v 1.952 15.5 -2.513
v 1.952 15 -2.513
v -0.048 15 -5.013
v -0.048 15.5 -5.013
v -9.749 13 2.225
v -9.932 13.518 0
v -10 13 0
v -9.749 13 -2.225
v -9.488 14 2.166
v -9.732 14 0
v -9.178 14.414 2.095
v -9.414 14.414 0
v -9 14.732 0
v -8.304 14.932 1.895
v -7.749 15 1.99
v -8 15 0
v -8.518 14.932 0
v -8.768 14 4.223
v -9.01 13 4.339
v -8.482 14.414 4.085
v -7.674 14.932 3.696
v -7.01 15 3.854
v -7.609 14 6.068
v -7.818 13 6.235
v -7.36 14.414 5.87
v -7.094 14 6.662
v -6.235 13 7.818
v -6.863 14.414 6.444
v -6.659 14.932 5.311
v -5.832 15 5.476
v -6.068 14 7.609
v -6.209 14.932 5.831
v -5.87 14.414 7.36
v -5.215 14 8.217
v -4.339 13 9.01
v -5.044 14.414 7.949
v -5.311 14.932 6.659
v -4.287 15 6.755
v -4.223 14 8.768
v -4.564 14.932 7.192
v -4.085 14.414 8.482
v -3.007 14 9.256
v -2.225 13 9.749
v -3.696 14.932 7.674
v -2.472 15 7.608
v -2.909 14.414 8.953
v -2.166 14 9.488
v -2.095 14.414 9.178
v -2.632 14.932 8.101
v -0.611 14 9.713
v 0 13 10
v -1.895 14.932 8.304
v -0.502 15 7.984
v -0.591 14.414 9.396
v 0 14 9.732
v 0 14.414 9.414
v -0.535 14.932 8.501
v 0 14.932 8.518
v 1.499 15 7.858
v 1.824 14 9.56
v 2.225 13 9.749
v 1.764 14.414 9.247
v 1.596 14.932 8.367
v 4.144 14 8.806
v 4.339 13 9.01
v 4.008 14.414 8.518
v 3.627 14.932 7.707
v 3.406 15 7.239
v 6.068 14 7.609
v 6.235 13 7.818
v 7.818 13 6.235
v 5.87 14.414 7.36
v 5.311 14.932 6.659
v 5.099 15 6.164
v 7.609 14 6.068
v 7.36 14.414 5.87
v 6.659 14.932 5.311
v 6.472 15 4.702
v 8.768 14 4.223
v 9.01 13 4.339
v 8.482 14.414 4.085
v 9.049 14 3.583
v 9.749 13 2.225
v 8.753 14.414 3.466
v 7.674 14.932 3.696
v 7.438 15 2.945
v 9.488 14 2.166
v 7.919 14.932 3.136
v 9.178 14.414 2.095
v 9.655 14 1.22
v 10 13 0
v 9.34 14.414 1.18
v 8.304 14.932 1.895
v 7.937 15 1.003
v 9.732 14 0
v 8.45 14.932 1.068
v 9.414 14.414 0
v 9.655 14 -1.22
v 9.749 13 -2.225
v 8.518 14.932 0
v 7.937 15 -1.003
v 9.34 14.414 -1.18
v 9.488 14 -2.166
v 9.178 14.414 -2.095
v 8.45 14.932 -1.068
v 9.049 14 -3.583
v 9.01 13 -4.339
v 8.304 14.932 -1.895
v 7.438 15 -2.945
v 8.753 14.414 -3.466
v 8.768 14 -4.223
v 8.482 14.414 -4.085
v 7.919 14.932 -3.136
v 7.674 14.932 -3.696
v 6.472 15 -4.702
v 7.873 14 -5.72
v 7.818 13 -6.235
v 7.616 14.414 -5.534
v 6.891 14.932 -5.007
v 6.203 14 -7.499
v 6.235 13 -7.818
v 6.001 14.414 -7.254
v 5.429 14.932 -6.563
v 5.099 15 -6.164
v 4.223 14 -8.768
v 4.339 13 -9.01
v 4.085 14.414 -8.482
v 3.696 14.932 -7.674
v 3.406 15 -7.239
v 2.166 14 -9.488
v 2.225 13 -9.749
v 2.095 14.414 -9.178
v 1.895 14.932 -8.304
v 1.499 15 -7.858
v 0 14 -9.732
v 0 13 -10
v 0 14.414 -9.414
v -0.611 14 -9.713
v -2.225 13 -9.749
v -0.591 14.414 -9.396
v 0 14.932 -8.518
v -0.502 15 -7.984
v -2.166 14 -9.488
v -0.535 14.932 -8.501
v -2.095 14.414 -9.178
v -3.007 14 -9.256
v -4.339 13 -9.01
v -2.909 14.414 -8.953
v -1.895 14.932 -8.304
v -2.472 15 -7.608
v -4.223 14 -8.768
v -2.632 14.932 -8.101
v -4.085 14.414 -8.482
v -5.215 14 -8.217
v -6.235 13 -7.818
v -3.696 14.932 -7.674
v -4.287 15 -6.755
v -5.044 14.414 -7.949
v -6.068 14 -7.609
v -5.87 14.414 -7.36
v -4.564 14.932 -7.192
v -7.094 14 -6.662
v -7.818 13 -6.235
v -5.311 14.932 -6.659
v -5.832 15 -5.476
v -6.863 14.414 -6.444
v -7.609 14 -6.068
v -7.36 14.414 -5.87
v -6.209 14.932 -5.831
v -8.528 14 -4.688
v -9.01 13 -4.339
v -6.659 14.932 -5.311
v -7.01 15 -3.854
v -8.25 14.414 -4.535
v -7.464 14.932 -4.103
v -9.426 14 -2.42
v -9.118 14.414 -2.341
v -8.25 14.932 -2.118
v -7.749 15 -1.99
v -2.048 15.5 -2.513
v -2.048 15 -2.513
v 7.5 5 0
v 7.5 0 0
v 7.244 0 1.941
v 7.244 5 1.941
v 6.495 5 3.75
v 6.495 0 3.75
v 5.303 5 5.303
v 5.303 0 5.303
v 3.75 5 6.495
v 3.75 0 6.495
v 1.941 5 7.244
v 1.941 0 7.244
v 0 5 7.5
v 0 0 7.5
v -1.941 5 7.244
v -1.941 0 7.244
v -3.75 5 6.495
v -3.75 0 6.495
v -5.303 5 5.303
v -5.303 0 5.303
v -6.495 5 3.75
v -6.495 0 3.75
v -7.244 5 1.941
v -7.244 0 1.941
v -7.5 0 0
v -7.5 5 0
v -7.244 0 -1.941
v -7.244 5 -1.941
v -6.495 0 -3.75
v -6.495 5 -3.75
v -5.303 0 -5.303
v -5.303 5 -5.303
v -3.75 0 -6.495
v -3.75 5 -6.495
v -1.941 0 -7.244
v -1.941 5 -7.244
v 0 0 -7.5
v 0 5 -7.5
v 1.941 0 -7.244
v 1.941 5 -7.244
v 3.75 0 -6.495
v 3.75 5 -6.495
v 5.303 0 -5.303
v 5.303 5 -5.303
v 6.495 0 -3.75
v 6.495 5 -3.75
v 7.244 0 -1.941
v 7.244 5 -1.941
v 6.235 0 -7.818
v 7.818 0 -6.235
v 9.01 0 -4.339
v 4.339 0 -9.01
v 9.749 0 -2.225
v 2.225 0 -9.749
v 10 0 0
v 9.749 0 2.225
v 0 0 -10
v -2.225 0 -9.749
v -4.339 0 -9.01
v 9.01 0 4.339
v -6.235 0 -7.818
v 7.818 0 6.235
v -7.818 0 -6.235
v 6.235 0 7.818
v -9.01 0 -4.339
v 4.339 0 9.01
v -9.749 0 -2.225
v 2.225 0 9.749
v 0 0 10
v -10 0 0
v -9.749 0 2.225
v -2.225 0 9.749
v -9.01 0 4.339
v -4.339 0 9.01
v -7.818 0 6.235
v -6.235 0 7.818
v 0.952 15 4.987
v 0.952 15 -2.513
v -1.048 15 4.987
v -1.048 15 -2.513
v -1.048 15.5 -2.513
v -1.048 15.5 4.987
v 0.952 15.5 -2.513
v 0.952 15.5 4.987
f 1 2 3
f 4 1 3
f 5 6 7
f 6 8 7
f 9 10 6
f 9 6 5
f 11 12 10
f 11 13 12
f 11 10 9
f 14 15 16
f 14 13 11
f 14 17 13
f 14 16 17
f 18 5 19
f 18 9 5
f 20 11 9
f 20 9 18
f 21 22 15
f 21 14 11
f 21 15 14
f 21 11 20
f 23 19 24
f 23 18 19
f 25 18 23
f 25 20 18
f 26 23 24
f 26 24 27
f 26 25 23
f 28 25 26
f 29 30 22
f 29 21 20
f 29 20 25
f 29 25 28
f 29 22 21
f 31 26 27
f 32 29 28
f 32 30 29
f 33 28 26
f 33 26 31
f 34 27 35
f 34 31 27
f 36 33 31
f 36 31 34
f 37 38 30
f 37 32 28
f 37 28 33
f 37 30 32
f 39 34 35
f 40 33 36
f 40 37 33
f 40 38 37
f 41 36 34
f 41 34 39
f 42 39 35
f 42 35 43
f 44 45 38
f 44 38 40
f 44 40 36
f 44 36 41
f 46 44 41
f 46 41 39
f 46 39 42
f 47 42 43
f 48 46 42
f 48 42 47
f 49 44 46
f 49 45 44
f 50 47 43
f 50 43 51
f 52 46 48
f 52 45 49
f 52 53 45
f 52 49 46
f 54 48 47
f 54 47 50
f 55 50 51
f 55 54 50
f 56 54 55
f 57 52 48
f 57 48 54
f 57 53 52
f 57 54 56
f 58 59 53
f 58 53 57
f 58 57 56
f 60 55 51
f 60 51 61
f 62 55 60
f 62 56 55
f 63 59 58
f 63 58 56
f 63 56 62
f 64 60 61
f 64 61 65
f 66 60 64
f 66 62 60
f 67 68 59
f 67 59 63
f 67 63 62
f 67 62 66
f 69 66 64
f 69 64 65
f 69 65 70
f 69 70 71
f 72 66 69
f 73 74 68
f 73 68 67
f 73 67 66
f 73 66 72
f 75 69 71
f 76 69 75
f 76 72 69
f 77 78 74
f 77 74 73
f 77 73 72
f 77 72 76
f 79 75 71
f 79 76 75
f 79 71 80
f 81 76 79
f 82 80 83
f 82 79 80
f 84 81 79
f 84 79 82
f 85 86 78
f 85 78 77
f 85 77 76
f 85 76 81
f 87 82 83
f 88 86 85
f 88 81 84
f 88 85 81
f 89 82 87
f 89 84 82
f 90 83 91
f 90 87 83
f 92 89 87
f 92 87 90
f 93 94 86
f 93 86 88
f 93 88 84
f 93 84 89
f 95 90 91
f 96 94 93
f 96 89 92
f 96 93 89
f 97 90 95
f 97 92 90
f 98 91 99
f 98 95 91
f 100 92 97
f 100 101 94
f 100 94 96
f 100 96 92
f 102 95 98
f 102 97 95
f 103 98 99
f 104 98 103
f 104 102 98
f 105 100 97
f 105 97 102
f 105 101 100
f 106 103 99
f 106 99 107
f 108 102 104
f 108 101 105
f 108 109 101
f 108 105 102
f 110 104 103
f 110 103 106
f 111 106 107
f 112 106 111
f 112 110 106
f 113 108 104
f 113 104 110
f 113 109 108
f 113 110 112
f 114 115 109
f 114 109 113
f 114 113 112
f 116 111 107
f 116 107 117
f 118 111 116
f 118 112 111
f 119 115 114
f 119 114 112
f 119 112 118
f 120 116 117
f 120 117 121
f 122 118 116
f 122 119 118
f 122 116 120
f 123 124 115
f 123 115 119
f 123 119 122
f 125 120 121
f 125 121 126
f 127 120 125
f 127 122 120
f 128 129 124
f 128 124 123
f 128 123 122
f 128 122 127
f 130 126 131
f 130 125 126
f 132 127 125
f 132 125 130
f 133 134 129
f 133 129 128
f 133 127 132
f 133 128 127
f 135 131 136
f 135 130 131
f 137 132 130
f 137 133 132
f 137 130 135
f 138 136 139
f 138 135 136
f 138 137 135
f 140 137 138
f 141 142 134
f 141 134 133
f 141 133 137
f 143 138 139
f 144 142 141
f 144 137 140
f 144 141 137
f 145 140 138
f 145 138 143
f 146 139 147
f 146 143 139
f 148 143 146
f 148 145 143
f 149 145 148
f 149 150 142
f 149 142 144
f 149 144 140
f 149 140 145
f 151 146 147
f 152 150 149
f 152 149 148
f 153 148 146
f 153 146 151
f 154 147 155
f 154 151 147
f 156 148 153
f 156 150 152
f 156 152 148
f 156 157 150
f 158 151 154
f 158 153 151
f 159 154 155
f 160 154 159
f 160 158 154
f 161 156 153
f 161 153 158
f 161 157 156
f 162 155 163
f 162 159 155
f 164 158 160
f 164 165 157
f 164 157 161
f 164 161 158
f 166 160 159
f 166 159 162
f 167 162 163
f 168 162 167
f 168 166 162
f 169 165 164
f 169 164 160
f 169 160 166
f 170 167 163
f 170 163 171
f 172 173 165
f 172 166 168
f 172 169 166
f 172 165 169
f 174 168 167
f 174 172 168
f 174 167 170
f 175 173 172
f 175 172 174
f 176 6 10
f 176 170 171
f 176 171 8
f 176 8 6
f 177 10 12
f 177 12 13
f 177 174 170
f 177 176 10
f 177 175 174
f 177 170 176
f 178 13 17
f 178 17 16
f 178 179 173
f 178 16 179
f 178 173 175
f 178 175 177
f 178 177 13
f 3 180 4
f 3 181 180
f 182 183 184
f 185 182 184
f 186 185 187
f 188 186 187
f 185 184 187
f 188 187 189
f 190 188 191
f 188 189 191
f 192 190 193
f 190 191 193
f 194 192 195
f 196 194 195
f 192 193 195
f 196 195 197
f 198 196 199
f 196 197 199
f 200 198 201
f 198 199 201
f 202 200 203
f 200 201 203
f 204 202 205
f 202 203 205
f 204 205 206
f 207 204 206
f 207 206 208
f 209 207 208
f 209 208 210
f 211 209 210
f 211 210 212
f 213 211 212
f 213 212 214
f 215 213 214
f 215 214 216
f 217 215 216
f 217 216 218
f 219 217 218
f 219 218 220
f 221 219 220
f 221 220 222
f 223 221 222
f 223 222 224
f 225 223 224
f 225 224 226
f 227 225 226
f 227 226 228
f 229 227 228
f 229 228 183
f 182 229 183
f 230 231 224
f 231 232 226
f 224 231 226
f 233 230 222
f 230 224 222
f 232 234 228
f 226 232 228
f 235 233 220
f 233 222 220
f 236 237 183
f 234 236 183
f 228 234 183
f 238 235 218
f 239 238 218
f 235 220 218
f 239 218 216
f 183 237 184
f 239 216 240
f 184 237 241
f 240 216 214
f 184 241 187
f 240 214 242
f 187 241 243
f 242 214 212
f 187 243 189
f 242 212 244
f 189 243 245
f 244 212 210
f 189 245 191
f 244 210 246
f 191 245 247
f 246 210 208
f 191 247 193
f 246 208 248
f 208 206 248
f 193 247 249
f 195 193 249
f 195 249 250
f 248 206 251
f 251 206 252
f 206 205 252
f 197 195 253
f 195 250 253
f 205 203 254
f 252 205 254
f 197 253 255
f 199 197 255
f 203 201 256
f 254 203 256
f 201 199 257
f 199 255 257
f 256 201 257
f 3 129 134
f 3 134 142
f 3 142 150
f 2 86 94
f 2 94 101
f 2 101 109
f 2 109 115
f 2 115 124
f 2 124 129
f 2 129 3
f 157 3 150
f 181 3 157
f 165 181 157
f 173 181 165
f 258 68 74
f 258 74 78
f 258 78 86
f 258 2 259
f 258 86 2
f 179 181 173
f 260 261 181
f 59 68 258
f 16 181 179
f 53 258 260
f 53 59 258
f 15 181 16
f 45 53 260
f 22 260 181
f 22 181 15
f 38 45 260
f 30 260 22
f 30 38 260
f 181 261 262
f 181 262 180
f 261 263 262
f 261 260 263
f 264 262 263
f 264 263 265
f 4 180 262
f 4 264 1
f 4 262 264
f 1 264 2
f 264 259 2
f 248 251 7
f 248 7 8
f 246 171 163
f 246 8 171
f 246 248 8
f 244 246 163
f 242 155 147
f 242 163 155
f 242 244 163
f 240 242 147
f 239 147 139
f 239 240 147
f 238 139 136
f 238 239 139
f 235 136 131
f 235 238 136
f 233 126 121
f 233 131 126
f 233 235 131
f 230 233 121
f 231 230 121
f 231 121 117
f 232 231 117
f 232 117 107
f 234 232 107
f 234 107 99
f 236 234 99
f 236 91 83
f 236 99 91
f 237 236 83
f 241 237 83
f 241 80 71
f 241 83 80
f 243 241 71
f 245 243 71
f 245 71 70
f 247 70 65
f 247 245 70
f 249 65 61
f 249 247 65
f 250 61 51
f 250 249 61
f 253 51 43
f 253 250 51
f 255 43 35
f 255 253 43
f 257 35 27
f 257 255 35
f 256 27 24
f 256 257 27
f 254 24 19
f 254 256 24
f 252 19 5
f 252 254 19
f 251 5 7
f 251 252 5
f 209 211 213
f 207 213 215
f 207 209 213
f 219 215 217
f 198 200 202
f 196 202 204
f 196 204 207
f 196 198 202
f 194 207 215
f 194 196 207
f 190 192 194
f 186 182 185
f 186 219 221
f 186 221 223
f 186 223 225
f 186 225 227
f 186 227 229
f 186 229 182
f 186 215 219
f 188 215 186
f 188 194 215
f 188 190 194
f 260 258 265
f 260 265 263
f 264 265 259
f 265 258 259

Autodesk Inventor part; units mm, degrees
ref_plane "YZ Plane" through (0, 0, 0) normal (1, 0, 0) x (0, 1, 0)
ref_plane "XZ Plane" through (0, 0, 0) normal (0, 1, 0) x (-1, 0, 0)
ref_plane "XY Plane" through (0, 0, 0) normal (0, 0, 1) x (1, 0, 0)
sketch "Sketch1" plane through (0, 0, 0) normal (0, 1, 0) x (-1, 0, 0)
  circle A0 centre (0, 0) radius 10
  dimension "d0" = 20
extrude "Extrusion1" add sketch "Sketch1" along normal blind 15
sketch "Sketch2" plane through (0, 0, 0) normal (0, -1, 0) x (1, 0, 0)
  circle A0 centre (0, 0) radius 7.5
  dimension "d3" = 15
extrude "Extrusion2" cut sketch "Sketch2" against normal blind 5
fillet "Fillet1" radius 2 1 edges at (10, 15, 0)
sketch "Sketch3" plane through (0, 15, 0) normal (0, 1, 0) x (1, 0, 0)
  line L0 (-0.048, -4.9874) -> (-1.048, -4.9874)
  line L1 (-1.048, -4.9874) -> (-1.048, 2.5126)
  line L2 (-1.048, 2.5126) -> (-2.048, 2.5126)
  line L3 (-2.048, 2.5126) -> (-0.048, 5.0126)
  line L4 (-0.048, 5.0126) -> (-0.048, -4.9874)
  line L5 (-0.048, -4.9874) -> (0.952, -4.9874)
  line L6 (0.952, -4.9874) -> (0.952, 2.5126)
  line L7 (0.952, 2.5126) -> (1.952, 2.5126)
  line L8 (1.952, 2.5126) -> (-0.048, 5.0126)
  point P0 (0, 0)
  dimension "d7" = 1
  dimension "d8" = 7.5
  dimension "d9" = 10
extrude "Extrusion3" add sketch "Sketch3" along normal blind 0.5
properties part number "Device Direction Button"
